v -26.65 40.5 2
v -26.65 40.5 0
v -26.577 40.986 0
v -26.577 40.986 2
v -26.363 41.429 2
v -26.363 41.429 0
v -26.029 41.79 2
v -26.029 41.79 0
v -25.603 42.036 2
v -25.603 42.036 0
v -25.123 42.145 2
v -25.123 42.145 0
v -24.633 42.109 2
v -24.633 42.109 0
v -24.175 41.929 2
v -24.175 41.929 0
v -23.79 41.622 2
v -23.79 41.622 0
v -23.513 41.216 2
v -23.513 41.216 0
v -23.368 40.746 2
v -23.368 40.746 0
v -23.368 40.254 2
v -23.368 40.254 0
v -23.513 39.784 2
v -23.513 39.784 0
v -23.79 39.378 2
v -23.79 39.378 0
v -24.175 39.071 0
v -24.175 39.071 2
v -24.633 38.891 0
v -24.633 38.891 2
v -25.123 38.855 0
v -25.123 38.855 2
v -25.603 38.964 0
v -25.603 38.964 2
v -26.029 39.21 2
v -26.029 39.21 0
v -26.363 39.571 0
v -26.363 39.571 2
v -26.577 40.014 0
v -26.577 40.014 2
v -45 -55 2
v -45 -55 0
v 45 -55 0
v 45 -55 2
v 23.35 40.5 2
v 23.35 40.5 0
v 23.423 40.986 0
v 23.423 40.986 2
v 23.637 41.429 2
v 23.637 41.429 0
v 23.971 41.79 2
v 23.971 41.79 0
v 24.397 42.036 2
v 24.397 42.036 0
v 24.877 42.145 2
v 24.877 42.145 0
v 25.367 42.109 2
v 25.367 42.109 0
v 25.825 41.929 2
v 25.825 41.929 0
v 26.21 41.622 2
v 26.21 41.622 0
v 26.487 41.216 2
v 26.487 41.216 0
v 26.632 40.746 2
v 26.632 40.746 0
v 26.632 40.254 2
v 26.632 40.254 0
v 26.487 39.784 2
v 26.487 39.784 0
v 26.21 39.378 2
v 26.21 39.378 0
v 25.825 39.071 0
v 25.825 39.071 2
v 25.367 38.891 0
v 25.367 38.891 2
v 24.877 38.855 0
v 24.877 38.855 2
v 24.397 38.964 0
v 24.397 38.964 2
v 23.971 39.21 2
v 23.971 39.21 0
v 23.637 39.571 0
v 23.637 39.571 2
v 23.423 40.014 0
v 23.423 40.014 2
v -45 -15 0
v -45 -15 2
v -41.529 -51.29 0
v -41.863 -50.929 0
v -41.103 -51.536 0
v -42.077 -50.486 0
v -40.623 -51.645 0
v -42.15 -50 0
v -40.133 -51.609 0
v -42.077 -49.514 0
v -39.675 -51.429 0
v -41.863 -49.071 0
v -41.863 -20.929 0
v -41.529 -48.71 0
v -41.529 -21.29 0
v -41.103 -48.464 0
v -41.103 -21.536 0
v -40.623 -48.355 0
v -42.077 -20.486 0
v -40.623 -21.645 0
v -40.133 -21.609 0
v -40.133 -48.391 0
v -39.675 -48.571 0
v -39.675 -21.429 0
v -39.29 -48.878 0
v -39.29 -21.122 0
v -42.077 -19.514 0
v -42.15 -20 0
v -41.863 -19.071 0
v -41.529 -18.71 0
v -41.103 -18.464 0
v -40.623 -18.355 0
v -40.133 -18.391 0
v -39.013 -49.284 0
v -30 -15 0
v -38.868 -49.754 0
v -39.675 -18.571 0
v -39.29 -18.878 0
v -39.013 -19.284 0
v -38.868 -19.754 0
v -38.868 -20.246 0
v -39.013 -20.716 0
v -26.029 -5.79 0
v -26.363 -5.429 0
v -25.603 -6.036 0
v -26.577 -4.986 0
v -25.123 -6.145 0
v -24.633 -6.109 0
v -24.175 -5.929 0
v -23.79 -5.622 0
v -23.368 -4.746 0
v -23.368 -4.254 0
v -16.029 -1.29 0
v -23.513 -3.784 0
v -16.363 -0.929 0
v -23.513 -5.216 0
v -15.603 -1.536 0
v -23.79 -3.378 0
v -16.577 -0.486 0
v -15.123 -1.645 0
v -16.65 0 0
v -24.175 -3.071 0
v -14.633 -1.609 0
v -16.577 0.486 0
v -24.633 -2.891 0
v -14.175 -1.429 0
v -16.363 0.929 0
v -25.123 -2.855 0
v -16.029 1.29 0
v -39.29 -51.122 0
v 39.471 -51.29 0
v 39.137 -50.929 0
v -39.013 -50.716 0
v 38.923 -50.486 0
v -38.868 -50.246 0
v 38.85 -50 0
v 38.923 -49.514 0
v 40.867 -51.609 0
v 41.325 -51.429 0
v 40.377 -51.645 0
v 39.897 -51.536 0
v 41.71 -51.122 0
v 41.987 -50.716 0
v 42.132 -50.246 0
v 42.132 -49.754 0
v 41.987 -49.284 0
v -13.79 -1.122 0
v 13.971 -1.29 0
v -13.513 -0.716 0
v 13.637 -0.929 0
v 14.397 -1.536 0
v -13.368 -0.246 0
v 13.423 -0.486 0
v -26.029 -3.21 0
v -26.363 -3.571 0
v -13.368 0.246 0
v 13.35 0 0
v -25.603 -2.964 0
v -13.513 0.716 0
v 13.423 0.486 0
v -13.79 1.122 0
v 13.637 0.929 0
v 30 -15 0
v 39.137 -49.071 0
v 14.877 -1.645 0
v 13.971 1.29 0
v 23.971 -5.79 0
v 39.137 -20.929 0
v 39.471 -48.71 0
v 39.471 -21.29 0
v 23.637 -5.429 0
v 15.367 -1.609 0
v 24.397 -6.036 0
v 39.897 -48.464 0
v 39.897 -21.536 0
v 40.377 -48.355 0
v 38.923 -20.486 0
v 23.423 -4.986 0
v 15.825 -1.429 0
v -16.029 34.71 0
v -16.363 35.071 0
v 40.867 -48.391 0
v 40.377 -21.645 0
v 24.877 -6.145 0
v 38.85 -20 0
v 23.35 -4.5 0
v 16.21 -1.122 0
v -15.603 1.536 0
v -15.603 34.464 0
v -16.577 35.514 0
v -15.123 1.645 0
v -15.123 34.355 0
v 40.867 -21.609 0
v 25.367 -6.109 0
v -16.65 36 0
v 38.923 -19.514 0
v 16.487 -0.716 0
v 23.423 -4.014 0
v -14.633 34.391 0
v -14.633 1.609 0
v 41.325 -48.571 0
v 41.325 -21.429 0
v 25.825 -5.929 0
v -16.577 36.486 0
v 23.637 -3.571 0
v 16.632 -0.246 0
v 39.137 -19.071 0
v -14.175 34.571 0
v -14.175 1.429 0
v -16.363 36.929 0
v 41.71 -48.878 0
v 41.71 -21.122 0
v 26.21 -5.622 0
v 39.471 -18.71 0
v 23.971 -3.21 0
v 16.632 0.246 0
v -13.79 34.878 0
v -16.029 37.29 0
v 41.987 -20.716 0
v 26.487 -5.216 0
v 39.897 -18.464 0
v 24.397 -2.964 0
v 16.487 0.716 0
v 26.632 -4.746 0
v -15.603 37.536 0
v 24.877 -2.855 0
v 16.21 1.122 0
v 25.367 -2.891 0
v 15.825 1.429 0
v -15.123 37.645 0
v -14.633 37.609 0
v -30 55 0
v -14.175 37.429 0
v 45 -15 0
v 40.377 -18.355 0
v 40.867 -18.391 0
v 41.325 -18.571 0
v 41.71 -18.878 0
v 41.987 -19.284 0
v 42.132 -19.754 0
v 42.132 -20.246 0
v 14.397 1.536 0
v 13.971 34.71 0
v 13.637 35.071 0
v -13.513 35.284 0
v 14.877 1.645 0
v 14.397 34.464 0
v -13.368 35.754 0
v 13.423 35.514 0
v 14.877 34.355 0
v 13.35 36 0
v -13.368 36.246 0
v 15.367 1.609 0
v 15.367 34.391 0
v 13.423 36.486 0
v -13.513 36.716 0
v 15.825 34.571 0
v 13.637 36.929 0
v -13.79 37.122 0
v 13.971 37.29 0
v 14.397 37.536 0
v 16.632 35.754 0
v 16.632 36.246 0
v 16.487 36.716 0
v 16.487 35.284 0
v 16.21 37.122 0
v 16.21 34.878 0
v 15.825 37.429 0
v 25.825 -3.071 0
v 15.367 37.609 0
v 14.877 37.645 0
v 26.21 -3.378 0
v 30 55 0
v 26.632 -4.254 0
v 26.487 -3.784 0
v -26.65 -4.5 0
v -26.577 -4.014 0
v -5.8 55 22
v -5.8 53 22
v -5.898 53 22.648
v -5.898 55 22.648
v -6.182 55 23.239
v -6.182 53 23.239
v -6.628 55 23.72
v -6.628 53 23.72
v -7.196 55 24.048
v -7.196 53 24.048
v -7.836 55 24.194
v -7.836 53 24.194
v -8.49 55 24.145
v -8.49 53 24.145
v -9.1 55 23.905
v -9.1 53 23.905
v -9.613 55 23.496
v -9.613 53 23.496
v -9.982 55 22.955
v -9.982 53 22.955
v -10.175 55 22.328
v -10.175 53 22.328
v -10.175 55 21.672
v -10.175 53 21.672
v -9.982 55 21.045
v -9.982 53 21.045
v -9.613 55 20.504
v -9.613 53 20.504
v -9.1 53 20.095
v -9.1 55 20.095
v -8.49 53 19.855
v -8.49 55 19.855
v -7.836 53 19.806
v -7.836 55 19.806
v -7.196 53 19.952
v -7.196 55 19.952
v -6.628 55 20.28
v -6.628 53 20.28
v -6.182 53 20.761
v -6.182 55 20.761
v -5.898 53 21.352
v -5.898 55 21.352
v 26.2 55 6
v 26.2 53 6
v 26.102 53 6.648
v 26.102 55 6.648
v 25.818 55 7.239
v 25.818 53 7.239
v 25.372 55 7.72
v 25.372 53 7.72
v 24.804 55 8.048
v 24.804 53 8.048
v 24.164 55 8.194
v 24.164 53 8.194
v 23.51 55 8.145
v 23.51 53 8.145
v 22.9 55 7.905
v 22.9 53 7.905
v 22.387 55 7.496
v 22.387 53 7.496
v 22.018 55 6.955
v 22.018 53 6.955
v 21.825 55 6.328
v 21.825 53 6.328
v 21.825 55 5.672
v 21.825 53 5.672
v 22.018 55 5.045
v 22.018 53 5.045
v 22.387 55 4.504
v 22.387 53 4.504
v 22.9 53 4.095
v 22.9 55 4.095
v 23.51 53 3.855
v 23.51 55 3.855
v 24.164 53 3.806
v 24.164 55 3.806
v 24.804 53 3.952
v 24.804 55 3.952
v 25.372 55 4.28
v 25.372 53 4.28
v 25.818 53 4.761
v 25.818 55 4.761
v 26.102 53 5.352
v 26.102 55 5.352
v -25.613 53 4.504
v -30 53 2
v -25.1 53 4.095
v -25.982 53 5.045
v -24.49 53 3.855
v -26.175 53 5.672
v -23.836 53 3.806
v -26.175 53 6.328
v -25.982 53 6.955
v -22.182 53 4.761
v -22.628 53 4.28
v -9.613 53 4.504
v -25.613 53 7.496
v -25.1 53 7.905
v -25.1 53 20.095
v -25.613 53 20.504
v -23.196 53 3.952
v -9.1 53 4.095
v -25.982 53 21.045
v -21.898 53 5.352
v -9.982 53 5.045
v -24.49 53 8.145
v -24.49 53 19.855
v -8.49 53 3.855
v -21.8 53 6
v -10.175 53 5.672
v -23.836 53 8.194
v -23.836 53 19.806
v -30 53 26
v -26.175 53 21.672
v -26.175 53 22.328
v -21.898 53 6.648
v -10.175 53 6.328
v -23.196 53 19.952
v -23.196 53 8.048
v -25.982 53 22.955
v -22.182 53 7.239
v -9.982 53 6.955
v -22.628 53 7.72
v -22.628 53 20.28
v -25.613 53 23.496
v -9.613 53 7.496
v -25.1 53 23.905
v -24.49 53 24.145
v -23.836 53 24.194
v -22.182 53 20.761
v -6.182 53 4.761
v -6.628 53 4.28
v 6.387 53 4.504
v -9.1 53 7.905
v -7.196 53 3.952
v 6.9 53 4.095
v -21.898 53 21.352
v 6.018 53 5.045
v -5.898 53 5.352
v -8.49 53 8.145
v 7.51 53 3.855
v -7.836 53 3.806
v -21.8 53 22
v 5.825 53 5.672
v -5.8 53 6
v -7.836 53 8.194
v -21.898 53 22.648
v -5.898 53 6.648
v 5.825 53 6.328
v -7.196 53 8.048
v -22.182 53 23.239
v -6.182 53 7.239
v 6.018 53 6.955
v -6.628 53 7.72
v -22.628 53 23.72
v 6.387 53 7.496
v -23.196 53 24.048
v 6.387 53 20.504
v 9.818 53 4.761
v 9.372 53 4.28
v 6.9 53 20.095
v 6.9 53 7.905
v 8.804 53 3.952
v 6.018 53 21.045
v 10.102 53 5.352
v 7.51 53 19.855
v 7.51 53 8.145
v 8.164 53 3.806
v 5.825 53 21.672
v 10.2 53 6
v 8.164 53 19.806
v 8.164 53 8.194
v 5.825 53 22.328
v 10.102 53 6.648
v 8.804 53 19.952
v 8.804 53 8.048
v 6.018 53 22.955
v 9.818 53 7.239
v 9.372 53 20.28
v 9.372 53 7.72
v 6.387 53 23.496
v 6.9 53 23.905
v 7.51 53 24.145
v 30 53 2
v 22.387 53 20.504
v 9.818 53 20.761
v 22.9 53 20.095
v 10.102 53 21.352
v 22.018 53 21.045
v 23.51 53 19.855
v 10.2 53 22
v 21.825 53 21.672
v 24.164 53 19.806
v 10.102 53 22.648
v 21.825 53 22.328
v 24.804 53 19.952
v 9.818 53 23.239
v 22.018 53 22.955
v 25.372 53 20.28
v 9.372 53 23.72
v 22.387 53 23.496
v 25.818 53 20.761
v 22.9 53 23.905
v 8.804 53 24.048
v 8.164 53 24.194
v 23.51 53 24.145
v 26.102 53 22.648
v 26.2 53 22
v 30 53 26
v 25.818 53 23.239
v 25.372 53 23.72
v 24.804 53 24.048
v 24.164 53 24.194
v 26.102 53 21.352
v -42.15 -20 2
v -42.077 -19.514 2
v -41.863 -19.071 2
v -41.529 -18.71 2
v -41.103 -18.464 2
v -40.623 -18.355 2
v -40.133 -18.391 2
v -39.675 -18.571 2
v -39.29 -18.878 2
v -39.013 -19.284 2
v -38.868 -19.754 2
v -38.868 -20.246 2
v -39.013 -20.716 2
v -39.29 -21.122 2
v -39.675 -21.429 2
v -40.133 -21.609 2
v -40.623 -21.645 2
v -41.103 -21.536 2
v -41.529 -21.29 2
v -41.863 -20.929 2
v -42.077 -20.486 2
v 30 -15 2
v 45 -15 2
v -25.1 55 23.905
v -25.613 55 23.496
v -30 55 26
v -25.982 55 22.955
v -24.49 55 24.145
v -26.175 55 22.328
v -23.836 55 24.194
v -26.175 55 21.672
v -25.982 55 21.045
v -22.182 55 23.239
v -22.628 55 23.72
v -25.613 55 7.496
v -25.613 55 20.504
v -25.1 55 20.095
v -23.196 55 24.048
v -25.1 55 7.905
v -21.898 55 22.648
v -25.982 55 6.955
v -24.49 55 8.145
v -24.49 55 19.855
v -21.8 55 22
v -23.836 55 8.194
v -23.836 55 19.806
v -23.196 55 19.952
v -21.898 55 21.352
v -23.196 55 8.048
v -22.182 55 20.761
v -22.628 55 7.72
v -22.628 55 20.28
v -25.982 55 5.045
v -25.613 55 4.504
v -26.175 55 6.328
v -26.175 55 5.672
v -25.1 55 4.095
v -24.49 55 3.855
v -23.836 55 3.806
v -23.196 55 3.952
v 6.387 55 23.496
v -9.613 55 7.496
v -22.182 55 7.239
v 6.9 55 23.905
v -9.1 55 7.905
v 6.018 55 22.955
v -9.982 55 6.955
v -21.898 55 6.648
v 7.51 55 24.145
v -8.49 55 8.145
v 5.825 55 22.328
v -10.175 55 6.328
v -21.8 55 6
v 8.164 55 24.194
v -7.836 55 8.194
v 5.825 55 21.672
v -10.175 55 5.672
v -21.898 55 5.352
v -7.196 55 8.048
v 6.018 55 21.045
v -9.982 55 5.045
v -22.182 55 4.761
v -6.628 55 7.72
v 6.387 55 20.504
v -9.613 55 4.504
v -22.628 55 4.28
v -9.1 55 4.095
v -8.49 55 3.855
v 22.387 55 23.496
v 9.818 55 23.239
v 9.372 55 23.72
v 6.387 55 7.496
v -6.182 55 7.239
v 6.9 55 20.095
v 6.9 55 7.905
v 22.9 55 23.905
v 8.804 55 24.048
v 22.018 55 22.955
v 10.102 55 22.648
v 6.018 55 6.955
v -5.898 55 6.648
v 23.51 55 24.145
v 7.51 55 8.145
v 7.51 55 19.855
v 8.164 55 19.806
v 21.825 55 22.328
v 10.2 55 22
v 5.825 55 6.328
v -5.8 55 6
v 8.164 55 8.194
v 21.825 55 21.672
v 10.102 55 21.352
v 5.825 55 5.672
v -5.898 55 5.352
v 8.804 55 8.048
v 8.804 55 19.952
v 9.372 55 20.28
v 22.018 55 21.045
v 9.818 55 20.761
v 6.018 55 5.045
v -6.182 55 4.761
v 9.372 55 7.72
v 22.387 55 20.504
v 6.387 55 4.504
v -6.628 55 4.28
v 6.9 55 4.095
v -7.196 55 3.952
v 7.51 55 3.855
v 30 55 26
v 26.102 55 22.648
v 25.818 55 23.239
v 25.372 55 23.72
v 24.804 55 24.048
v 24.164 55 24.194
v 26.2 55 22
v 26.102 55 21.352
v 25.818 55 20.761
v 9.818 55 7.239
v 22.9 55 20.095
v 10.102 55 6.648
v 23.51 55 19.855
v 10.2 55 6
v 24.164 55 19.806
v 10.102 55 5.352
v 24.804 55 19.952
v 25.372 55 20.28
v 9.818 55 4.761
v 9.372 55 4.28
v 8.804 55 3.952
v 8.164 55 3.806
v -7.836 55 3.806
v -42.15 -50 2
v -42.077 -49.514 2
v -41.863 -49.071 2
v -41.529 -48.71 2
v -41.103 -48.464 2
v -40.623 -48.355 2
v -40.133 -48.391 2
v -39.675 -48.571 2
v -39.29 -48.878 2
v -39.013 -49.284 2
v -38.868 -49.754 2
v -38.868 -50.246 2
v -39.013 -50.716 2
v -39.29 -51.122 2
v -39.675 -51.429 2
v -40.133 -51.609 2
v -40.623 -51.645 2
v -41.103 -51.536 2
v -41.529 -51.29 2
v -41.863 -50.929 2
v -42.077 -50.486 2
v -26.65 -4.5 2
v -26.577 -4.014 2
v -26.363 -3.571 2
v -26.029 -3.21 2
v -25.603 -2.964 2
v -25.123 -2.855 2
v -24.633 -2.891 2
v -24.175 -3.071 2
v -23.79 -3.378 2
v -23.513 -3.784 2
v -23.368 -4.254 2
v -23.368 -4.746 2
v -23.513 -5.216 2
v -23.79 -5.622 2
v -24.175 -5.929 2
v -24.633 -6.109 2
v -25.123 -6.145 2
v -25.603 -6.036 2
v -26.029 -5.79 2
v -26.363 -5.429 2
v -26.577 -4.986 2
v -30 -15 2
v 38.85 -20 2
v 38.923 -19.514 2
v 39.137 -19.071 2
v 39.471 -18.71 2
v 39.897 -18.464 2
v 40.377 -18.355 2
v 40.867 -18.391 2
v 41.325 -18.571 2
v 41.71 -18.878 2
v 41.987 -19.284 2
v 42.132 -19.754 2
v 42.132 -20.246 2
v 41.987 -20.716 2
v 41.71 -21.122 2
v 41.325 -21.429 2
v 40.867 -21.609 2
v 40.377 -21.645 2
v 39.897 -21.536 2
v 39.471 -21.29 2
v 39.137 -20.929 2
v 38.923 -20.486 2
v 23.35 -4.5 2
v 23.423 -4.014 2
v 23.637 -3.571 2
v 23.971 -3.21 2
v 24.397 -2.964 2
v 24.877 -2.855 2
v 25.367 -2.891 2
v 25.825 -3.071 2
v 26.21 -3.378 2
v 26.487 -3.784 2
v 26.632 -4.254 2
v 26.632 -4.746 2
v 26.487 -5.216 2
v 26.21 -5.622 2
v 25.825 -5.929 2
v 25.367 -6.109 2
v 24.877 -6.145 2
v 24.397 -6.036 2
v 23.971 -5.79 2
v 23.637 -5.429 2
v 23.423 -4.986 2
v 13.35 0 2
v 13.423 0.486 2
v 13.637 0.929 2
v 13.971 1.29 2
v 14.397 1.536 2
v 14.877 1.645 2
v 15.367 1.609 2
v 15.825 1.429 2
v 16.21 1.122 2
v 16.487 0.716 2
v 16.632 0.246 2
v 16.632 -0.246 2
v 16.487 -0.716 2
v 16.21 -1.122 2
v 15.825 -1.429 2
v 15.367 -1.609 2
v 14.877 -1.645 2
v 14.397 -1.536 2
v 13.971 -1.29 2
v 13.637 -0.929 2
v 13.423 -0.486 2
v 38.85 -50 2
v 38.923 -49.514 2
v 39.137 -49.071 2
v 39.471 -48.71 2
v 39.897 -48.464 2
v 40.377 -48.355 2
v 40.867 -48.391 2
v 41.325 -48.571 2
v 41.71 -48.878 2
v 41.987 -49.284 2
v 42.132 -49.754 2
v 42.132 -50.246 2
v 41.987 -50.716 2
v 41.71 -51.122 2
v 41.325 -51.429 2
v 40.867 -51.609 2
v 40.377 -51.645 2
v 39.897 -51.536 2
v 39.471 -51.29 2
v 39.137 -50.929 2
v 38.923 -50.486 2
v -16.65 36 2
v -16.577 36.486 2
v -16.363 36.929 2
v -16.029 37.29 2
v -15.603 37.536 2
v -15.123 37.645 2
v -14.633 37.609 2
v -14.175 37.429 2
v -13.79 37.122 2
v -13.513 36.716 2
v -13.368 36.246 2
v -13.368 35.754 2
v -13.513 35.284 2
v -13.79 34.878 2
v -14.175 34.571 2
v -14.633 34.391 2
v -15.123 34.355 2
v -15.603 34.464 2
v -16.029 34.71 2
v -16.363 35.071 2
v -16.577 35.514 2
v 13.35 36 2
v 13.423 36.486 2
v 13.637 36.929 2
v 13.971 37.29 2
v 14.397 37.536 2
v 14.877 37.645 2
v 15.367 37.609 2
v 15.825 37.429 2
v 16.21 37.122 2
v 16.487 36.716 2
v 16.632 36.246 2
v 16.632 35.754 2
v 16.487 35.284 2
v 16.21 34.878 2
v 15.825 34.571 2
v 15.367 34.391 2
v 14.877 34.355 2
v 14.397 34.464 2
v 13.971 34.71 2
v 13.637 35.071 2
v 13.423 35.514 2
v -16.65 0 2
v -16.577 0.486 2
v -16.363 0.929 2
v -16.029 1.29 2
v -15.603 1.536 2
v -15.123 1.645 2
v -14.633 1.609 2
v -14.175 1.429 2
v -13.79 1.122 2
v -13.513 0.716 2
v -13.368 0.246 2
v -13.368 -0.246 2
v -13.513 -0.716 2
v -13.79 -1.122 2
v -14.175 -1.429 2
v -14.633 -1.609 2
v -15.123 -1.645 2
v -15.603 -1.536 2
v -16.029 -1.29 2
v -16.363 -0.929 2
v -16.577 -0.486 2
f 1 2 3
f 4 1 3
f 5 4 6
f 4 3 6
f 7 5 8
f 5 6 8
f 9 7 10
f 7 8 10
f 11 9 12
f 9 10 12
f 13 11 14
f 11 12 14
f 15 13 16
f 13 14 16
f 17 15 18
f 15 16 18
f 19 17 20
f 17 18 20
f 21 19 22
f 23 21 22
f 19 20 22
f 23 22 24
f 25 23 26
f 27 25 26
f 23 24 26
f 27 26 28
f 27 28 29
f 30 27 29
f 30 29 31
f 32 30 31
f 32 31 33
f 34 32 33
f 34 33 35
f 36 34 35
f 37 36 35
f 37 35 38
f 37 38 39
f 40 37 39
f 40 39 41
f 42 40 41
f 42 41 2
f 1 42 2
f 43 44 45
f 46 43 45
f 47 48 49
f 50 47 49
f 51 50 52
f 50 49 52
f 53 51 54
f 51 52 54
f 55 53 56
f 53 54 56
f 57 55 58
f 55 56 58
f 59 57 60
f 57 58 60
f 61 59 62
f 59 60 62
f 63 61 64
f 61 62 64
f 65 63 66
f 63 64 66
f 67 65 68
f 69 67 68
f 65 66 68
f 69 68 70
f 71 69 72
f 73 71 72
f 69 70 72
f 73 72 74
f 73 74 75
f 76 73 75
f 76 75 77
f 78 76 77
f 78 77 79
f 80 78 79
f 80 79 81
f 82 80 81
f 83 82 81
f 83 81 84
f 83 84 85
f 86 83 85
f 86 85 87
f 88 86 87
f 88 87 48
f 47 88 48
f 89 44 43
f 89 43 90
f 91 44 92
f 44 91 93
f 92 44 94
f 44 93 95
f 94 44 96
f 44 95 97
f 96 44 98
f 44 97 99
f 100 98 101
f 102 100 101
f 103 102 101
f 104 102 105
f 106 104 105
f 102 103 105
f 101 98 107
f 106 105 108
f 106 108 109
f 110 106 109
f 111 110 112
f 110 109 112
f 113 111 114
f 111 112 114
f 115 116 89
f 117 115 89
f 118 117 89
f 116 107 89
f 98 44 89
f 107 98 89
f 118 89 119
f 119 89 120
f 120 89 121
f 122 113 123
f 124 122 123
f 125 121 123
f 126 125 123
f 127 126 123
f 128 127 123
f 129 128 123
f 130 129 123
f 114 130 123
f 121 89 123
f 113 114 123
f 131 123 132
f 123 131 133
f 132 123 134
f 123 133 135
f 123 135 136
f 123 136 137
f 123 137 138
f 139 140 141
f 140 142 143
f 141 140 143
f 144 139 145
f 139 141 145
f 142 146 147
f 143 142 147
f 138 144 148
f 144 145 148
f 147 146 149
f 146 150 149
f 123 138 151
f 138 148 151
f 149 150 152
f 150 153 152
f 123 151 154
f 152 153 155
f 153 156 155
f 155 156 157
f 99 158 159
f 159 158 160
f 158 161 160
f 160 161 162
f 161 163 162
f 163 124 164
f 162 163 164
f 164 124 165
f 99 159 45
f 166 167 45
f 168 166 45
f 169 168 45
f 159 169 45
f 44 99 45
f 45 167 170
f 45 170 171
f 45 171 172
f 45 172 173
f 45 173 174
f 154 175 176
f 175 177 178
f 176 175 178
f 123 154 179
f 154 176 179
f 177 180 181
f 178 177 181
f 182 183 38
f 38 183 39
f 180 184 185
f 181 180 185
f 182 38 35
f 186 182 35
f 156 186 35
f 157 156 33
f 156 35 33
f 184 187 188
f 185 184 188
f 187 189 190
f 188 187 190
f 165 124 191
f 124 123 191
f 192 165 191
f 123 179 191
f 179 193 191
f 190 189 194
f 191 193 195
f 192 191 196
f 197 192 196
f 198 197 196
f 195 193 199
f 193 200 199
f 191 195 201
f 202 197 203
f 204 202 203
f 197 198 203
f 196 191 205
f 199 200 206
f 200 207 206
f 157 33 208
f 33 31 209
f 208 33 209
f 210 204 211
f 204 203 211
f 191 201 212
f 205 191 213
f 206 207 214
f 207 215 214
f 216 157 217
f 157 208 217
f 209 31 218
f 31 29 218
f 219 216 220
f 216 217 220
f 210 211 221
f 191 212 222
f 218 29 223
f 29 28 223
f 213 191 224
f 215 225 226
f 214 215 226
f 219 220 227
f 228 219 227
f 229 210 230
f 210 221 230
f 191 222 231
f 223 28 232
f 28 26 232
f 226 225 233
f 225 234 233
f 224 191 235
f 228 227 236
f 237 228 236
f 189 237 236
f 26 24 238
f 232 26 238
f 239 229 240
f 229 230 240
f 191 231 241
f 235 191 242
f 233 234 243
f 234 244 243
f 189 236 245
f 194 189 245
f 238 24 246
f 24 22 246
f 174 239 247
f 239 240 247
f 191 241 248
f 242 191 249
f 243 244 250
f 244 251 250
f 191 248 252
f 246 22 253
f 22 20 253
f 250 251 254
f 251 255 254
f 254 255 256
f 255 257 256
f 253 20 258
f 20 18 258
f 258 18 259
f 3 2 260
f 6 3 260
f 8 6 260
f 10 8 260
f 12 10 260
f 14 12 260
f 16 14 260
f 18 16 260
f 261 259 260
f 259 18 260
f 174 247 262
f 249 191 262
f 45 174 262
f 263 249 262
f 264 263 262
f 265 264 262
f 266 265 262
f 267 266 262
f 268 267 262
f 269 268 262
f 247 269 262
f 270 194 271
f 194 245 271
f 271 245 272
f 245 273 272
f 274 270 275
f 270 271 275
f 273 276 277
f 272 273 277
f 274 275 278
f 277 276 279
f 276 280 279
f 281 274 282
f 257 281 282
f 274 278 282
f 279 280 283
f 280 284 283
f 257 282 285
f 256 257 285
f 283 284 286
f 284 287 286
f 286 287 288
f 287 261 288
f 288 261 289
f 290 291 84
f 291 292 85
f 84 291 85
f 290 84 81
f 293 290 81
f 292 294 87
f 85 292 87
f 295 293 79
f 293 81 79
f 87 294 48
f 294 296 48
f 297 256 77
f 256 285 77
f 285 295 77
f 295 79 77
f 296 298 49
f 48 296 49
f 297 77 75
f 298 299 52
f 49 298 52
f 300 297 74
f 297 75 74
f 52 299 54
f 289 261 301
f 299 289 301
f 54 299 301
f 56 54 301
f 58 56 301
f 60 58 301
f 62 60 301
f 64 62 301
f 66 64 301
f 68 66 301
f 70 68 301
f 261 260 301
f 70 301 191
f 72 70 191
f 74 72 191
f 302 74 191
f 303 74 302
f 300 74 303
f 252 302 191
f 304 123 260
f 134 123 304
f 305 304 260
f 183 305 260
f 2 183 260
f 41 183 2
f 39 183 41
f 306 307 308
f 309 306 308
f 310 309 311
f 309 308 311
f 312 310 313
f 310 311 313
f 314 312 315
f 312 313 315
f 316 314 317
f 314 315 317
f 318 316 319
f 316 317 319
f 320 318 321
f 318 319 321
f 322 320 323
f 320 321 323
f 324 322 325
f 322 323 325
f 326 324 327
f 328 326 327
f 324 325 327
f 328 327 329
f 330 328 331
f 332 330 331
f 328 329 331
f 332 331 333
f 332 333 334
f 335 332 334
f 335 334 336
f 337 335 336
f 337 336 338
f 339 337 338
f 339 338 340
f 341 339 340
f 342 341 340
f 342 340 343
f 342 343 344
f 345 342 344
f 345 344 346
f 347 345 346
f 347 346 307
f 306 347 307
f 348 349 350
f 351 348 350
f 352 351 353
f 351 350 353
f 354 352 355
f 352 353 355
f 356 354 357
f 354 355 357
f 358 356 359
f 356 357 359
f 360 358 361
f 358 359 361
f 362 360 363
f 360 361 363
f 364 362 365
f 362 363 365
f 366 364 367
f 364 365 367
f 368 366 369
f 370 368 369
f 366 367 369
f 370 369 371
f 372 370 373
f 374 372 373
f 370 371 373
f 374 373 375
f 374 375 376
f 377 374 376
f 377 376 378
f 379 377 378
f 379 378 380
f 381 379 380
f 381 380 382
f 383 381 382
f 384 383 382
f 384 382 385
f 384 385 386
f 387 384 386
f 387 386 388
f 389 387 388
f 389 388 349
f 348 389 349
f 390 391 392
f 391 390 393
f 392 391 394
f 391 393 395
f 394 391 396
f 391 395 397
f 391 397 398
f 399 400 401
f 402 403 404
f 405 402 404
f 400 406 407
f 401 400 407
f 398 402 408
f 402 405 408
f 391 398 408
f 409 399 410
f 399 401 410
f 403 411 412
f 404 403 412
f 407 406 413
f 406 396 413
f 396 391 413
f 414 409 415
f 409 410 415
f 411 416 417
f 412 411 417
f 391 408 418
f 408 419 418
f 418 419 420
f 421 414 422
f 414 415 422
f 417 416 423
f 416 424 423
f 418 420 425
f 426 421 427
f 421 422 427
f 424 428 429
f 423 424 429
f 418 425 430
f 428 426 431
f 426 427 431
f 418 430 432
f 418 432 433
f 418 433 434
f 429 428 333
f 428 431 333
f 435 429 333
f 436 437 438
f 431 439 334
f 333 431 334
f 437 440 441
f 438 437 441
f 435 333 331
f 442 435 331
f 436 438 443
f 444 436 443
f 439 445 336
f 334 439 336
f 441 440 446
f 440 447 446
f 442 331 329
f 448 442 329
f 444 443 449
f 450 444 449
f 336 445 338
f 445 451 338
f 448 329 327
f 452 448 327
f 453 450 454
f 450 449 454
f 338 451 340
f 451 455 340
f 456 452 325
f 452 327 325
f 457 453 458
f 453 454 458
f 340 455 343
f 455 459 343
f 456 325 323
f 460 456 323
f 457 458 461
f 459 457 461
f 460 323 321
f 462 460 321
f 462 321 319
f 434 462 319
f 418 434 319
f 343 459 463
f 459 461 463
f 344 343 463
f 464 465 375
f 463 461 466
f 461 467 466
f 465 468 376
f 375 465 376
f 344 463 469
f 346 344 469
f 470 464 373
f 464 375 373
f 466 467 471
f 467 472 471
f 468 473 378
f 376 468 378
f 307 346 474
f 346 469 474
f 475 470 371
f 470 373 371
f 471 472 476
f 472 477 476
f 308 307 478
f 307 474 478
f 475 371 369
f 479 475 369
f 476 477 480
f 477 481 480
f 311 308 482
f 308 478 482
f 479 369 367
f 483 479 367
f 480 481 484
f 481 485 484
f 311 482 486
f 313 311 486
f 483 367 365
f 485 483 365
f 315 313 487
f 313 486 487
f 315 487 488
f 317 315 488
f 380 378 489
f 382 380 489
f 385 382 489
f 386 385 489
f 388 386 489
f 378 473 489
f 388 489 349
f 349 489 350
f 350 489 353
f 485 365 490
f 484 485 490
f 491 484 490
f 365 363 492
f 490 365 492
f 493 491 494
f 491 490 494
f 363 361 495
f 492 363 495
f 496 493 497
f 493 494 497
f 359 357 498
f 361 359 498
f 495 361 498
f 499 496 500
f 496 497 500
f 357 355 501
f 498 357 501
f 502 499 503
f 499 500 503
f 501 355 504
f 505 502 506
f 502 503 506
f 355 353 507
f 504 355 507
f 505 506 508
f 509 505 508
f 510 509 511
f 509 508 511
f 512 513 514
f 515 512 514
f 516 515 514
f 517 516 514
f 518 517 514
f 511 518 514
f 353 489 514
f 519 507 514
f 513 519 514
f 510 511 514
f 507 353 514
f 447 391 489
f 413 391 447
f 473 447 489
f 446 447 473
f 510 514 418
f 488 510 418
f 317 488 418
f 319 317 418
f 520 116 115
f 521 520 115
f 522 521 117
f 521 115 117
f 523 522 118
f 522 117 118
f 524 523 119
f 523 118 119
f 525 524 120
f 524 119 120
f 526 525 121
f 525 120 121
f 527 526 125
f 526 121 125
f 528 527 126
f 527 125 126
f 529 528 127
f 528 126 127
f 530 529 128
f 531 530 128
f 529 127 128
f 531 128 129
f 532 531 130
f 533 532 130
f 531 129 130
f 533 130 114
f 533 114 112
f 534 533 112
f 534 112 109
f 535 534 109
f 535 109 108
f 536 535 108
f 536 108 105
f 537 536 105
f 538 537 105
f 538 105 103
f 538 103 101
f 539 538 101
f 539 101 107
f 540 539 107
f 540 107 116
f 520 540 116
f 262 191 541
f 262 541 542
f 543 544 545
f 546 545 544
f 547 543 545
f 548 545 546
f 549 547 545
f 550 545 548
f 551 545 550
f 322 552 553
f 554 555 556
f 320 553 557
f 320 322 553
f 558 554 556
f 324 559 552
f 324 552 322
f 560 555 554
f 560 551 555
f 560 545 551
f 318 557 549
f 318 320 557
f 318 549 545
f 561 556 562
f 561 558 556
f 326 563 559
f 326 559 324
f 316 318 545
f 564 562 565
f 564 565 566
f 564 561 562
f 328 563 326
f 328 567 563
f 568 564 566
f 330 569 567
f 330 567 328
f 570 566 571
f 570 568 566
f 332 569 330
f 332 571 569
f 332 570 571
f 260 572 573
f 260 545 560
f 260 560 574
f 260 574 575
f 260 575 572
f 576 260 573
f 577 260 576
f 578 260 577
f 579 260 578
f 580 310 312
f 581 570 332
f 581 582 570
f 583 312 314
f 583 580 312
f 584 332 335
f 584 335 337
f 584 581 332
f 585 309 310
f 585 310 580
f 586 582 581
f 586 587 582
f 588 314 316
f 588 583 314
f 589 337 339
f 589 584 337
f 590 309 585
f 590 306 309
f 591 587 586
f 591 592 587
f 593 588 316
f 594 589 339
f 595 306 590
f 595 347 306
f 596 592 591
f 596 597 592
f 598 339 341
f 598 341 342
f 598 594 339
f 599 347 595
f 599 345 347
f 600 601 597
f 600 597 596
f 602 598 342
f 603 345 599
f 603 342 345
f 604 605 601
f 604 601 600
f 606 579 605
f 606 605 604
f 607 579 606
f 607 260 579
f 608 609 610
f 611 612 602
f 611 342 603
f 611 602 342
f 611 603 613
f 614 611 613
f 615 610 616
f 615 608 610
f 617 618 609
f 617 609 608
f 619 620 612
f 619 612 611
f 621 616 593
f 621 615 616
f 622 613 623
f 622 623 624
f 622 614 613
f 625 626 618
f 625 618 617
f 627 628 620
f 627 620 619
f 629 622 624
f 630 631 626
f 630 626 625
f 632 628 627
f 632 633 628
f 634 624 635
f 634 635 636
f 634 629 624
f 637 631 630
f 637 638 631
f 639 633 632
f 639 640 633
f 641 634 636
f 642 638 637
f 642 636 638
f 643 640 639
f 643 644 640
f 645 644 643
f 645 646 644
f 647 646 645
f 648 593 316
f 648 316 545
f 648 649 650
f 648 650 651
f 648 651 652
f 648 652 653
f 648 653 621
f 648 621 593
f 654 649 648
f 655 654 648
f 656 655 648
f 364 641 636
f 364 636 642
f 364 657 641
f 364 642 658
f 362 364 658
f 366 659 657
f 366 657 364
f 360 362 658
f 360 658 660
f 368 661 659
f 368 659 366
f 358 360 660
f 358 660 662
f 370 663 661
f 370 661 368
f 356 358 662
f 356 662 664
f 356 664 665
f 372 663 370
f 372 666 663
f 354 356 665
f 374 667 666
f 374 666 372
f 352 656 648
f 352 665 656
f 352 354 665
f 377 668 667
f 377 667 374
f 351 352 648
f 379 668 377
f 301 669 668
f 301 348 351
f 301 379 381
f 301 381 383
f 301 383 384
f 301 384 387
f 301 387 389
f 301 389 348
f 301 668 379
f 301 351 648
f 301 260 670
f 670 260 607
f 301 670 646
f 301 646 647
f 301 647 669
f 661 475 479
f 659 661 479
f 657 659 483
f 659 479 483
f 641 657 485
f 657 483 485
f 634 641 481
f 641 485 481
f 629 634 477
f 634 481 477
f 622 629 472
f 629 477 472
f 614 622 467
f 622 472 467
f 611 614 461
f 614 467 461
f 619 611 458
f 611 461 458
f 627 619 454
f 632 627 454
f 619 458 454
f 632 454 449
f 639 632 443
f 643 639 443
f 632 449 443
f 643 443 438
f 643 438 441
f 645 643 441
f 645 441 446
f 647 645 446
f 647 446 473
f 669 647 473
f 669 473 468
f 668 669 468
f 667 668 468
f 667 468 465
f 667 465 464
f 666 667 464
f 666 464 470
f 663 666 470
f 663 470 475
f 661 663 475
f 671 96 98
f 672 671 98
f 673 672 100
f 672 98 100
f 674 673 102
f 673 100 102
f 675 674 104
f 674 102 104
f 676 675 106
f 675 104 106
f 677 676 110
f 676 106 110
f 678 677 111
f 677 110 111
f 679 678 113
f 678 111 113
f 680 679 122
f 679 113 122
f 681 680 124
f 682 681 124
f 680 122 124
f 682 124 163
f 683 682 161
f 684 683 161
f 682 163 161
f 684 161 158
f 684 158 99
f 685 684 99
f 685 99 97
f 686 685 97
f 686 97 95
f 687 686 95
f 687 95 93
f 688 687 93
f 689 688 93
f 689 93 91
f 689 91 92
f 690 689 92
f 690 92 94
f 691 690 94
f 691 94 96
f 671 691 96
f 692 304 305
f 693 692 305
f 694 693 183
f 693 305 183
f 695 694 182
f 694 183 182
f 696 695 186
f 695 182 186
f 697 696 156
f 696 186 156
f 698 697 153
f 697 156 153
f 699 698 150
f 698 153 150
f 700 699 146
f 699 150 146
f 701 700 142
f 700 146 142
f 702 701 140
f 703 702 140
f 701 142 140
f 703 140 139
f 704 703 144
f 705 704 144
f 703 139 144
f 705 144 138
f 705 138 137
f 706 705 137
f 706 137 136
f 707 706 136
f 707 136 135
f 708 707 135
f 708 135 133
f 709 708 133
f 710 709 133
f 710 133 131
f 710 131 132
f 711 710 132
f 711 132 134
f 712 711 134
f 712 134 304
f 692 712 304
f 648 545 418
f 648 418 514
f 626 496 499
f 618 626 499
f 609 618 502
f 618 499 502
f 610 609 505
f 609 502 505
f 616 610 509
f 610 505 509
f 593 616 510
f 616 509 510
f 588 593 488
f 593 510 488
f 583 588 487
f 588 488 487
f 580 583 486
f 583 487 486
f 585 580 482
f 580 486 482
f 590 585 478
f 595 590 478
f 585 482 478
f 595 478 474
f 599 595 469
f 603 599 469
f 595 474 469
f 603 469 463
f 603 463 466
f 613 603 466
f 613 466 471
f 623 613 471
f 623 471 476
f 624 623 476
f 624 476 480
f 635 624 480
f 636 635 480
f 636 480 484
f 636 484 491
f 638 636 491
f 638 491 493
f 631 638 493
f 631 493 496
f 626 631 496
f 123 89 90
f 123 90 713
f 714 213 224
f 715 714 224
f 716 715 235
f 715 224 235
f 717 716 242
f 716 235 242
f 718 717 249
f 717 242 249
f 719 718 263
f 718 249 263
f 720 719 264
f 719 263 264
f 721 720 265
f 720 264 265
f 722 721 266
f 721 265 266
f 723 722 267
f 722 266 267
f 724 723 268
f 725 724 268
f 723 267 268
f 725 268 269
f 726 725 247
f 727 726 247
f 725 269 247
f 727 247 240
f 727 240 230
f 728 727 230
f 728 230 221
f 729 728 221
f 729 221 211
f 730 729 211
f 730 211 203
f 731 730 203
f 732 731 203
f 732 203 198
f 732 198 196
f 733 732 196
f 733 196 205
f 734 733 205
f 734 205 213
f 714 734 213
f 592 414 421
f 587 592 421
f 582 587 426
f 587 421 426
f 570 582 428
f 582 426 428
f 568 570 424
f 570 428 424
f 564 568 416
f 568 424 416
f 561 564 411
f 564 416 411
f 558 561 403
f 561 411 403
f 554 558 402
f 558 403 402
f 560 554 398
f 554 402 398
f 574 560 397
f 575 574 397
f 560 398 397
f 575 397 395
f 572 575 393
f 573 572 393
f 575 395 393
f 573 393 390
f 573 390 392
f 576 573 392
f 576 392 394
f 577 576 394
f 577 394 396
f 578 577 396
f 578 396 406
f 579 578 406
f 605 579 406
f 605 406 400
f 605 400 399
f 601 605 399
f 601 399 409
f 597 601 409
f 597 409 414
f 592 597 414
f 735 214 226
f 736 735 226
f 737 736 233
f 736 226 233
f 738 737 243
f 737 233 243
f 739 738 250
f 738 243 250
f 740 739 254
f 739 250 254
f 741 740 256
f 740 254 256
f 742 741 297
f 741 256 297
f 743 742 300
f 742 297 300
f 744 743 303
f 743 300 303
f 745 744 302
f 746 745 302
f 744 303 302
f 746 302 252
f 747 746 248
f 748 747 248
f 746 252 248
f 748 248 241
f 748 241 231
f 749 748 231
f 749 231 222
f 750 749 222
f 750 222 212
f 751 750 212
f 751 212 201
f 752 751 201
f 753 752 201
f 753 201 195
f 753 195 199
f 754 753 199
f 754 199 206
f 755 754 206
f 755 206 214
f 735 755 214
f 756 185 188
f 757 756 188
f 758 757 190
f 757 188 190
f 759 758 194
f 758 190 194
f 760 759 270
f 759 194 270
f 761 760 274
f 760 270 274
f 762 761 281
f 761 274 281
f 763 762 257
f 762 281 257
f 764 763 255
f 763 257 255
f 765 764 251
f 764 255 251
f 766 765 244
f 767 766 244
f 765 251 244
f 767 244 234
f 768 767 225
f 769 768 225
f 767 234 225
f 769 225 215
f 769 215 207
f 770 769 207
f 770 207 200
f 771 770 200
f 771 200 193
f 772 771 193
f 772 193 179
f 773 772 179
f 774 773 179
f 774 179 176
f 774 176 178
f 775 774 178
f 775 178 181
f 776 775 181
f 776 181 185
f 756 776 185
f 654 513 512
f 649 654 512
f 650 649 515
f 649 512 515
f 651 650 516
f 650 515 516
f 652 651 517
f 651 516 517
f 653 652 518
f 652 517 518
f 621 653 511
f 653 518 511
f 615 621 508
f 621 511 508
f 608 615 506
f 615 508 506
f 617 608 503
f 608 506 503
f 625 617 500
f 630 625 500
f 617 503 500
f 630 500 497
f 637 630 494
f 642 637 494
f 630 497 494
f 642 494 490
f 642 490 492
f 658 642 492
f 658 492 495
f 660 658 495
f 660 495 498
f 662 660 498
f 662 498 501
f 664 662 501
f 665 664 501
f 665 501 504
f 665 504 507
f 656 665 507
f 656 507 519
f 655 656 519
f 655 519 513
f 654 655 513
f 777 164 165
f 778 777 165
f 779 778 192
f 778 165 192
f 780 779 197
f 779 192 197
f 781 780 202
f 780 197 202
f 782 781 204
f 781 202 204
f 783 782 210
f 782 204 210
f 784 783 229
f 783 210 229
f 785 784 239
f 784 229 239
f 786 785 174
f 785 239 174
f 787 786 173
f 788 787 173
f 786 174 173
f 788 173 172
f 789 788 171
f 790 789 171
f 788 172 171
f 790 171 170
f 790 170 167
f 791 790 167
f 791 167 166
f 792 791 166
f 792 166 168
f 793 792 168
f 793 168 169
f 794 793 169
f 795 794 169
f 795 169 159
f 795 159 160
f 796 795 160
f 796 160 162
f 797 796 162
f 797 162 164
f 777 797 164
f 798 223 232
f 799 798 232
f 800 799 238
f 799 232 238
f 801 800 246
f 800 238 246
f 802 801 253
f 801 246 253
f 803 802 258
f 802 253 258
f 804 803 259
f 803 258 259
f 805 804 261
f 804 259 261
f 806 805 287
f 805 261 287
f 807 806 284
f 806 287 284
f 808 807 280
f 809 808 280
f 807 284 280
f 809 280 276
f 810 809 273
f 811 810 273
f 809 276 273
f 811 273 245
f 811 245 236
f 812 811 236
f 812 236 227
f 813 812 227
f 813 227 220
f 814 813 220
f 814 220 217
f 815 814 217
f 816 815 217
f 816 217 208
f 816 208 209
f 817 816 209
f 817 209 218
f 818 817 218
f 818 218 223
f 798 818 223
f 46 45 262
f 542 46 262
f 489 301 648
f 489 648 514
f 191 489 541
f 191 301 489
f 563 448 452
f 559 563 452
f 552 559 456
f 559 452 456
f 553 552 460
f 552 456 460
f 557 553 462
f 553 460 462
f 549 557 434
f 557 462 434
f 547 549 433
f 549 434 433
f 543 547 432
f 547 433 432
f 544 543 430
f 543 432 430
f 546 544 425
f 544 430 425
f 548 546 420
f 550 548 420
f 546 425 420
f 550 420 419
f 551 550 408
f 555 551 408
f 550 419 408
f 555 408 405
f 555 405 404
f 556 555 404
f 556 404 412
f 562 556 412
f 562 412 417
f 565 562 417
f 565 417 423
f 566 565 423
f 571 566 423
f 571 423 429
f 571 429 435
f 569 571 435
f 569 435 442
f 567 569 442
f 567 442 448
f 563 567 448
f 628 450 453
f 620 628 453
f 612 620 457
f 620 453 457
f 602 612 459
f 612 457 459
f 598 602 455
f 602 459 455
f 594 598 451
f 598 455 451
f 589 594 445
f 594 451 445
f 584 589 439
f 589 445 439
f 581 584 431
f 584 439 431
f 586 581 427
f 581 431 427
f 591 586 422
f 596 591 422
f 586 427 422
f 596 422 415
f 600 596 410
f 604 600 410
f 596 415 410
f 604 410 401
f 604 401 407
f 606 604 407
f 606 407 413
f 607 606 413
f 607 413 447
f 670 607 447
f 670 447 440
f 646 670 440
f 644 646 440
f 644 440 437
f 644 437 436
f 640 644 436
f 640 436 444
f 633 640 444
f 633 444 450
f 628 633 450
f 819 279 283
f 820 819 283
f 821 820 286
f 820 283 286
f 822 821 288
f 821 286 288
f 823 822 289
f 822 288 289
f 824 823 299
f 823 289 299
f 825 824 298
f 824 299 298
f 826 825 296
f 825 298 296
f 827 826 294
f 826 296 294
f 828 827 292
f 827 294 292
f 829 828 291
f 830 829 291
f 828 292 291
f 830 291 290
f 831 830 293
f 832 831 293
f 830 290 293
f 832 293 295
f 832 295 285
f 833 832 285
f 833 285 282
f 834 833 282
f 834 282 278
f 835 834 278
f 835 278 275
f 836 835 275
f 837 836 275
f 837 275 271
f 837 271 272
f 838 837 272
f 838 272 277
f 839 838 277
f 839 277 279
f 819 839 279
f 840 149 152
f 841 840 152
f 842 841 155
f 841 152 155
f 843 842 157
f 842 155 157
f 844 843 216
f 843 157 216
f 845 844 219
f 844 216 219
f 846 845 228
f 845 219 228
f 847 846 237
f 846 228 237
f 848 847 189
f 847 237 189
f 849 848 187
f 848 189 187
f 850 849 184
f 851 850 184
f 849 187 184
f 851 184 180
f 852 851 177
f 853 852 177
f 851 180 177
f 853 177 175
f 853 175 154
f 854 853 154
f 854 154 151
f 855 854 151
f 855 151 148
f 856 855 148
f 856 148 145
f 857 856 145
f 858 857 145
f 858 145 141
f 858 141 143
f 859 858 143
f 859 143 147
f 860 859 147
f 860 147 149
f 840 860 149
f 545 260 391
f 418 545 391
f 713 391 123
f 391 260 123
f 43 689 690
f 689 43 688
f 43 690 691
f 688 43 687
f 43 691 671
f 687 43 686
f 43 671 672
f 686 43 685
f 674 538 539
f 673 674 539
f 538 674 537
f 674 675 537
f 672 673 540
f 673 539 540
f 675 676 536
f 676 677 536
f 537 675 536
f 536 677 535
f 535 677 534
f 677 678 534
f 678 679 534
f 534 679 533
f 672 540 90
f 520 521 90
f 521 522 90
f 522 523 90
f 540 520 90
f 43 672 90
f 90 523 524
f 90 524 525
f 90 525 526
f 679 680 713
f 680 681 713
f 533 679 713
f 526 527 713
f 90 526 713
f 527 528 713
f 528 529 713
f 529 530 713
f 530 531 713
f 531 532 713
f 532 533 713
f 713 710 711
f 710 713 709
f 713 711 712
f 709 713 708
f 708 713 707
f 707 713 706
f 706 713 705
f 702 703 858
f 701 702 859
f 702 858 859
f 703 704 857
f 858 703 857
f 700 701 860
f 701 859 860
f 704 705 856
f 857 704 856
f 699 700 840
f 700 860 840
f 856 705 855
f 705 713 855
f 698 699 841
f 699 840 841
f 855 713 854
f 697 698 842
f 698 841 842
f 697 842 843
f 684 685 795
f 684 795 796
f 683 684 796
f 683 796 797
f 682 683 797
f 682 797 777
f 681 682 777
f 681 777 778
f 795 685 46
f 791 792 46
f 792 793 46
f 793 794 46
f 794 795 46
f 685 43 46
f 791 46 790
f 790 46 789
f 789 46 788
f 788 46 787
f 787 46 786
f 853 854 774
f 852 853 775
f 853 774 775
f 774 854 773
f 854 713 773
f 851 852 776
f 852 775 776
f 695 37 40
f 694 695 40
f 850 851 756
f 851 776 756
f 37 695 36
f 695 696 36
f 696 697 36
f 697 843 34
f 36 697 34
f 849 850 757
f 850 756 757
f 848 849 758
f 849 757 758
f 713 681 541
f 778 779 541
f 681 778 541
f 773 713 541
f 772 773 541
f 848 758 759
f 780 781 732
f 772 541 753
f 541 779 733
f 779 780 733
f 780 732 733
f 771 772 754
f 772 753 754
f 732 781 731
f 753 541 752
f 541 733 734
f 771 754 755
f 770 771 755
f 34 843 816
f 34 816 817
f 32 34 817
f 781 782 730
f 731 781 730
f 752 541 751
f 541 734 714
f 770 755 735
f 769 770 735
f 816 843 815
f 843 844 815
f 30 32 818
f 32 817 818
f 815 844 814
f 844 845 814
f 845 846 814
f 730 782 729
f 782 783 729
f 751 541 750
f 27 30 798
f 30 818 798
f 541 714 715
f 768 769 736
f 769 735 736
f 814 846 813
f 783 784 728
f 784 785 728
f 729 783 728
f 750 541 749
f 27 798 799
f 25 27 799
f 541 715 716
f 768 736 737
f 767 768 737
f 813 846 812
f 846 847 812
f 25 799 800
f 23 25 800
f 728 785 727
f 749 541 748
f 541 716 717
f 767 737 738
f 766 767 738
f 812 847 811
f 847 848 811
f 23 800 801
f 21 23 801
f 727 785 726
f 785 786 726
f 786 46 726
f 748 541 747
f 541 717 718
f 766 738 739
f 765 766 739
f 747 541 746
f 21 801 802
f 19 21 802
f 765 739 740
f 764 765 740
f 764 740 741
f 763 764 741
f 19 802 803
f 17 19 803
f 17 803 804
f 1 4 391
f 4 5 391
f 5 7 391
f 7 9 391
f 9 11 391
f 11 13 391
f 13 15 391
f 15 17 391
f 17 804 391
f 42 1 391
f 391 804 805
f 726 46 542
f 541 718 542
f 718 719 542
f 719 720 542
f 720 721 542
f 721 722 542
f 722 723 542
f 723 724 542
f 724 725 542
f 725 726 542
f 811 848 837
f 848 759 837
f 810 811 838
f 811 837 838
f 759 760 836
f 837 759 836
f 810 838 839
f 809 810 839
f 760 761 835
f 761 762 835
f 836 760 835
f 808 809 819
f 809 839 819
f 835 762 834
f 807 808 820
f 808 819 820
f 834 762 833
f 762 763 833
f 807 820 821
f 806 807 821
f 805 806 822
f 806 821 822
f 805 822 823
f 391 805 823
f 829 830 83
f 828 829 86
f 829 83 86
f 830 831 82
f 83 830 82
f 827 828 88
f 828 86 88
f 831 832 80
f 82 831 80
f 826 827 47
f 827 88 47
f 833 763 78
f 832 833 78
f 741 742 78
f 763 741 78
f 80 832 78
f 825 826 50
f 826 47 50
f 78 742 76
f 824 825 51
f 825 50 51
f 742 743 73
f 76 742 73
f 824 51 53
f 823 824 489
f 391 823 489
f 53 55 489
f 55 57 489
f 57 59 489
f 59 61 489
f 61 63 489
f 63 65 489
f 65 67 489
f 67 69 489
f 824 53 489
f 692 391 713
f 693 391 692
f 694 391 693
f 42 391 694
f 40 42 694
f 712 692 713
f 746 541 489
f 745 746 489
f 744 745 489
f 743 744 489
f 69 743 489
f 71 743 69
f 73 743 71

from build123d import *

# Parameters (mm, degrees)
F0_W     = 90
F0_H     = 110
F1_DEPTH = 26
F2_W     = 108
F2_H     = 24
F3_DEPTH = 90.001
F5_D     = 4.4
F6_W     = 15
F6_H     = 70
F7_DEPTH = 26.001
F9_D     = 3.3


with BuildPart() as f1:
    # F0 (on Top) → F1 (new body)
    with BuildSketch(Plane.XY):
        Rectangle(F0_W, F0_H)
    extrude(amount=F1_DEPTH)

    # F2 (on face) → F3 (cut, through all)
    with BuildSketch(Plane.YZ.offset(45)):
        with Locations((-1, 14)):
            Rectangle(F2_W, F2_H)
    extrude(amount=-F3_DEPTH, mode=Mode.SUBTRACT)

    # F5 (through all)
    with Locations(Plane(origin=(0, 55, 0), x_dir=(-1, 0, 0), z_dir=(0, 1, 0))):
        with Locations((-8, 22), (8, 22), (8, 6), (-8, 6), (-24, 22), (24, 22), (24, 6), (-24, 6)):
            Hole(F5_D / 2)

    # F6 (on face) → F7 (cut, through all)
    with BuildSketch(Plane(origin=(0, 0, 0), x_dir=(1, 0, 0), z_dir=(0, 0, -1))):
        with Locations((-37.5, -20)):
            Rectangle(F6_W, F6_H)
        with Locations((37.5, -20)):
            Rectangle(F6_W, F6_H)
    extrude(amount=-F7_DEPTH, mode=Mode.SUBTRACT)

    # F9 (through all)
    with Locations(Plane.XY.offset(2)):
        with Locations((25, 40.5), (15, 36), (-15, 36), (-25, 40.5), (-25, -4.5), (-15, 0), (15, 0), (25, -4.5), (40.5, -20), (40.5, -50), (-40.5, -50), (-40.5, -20)):
            Hole(F9_D / 2)


solid = f1.part
